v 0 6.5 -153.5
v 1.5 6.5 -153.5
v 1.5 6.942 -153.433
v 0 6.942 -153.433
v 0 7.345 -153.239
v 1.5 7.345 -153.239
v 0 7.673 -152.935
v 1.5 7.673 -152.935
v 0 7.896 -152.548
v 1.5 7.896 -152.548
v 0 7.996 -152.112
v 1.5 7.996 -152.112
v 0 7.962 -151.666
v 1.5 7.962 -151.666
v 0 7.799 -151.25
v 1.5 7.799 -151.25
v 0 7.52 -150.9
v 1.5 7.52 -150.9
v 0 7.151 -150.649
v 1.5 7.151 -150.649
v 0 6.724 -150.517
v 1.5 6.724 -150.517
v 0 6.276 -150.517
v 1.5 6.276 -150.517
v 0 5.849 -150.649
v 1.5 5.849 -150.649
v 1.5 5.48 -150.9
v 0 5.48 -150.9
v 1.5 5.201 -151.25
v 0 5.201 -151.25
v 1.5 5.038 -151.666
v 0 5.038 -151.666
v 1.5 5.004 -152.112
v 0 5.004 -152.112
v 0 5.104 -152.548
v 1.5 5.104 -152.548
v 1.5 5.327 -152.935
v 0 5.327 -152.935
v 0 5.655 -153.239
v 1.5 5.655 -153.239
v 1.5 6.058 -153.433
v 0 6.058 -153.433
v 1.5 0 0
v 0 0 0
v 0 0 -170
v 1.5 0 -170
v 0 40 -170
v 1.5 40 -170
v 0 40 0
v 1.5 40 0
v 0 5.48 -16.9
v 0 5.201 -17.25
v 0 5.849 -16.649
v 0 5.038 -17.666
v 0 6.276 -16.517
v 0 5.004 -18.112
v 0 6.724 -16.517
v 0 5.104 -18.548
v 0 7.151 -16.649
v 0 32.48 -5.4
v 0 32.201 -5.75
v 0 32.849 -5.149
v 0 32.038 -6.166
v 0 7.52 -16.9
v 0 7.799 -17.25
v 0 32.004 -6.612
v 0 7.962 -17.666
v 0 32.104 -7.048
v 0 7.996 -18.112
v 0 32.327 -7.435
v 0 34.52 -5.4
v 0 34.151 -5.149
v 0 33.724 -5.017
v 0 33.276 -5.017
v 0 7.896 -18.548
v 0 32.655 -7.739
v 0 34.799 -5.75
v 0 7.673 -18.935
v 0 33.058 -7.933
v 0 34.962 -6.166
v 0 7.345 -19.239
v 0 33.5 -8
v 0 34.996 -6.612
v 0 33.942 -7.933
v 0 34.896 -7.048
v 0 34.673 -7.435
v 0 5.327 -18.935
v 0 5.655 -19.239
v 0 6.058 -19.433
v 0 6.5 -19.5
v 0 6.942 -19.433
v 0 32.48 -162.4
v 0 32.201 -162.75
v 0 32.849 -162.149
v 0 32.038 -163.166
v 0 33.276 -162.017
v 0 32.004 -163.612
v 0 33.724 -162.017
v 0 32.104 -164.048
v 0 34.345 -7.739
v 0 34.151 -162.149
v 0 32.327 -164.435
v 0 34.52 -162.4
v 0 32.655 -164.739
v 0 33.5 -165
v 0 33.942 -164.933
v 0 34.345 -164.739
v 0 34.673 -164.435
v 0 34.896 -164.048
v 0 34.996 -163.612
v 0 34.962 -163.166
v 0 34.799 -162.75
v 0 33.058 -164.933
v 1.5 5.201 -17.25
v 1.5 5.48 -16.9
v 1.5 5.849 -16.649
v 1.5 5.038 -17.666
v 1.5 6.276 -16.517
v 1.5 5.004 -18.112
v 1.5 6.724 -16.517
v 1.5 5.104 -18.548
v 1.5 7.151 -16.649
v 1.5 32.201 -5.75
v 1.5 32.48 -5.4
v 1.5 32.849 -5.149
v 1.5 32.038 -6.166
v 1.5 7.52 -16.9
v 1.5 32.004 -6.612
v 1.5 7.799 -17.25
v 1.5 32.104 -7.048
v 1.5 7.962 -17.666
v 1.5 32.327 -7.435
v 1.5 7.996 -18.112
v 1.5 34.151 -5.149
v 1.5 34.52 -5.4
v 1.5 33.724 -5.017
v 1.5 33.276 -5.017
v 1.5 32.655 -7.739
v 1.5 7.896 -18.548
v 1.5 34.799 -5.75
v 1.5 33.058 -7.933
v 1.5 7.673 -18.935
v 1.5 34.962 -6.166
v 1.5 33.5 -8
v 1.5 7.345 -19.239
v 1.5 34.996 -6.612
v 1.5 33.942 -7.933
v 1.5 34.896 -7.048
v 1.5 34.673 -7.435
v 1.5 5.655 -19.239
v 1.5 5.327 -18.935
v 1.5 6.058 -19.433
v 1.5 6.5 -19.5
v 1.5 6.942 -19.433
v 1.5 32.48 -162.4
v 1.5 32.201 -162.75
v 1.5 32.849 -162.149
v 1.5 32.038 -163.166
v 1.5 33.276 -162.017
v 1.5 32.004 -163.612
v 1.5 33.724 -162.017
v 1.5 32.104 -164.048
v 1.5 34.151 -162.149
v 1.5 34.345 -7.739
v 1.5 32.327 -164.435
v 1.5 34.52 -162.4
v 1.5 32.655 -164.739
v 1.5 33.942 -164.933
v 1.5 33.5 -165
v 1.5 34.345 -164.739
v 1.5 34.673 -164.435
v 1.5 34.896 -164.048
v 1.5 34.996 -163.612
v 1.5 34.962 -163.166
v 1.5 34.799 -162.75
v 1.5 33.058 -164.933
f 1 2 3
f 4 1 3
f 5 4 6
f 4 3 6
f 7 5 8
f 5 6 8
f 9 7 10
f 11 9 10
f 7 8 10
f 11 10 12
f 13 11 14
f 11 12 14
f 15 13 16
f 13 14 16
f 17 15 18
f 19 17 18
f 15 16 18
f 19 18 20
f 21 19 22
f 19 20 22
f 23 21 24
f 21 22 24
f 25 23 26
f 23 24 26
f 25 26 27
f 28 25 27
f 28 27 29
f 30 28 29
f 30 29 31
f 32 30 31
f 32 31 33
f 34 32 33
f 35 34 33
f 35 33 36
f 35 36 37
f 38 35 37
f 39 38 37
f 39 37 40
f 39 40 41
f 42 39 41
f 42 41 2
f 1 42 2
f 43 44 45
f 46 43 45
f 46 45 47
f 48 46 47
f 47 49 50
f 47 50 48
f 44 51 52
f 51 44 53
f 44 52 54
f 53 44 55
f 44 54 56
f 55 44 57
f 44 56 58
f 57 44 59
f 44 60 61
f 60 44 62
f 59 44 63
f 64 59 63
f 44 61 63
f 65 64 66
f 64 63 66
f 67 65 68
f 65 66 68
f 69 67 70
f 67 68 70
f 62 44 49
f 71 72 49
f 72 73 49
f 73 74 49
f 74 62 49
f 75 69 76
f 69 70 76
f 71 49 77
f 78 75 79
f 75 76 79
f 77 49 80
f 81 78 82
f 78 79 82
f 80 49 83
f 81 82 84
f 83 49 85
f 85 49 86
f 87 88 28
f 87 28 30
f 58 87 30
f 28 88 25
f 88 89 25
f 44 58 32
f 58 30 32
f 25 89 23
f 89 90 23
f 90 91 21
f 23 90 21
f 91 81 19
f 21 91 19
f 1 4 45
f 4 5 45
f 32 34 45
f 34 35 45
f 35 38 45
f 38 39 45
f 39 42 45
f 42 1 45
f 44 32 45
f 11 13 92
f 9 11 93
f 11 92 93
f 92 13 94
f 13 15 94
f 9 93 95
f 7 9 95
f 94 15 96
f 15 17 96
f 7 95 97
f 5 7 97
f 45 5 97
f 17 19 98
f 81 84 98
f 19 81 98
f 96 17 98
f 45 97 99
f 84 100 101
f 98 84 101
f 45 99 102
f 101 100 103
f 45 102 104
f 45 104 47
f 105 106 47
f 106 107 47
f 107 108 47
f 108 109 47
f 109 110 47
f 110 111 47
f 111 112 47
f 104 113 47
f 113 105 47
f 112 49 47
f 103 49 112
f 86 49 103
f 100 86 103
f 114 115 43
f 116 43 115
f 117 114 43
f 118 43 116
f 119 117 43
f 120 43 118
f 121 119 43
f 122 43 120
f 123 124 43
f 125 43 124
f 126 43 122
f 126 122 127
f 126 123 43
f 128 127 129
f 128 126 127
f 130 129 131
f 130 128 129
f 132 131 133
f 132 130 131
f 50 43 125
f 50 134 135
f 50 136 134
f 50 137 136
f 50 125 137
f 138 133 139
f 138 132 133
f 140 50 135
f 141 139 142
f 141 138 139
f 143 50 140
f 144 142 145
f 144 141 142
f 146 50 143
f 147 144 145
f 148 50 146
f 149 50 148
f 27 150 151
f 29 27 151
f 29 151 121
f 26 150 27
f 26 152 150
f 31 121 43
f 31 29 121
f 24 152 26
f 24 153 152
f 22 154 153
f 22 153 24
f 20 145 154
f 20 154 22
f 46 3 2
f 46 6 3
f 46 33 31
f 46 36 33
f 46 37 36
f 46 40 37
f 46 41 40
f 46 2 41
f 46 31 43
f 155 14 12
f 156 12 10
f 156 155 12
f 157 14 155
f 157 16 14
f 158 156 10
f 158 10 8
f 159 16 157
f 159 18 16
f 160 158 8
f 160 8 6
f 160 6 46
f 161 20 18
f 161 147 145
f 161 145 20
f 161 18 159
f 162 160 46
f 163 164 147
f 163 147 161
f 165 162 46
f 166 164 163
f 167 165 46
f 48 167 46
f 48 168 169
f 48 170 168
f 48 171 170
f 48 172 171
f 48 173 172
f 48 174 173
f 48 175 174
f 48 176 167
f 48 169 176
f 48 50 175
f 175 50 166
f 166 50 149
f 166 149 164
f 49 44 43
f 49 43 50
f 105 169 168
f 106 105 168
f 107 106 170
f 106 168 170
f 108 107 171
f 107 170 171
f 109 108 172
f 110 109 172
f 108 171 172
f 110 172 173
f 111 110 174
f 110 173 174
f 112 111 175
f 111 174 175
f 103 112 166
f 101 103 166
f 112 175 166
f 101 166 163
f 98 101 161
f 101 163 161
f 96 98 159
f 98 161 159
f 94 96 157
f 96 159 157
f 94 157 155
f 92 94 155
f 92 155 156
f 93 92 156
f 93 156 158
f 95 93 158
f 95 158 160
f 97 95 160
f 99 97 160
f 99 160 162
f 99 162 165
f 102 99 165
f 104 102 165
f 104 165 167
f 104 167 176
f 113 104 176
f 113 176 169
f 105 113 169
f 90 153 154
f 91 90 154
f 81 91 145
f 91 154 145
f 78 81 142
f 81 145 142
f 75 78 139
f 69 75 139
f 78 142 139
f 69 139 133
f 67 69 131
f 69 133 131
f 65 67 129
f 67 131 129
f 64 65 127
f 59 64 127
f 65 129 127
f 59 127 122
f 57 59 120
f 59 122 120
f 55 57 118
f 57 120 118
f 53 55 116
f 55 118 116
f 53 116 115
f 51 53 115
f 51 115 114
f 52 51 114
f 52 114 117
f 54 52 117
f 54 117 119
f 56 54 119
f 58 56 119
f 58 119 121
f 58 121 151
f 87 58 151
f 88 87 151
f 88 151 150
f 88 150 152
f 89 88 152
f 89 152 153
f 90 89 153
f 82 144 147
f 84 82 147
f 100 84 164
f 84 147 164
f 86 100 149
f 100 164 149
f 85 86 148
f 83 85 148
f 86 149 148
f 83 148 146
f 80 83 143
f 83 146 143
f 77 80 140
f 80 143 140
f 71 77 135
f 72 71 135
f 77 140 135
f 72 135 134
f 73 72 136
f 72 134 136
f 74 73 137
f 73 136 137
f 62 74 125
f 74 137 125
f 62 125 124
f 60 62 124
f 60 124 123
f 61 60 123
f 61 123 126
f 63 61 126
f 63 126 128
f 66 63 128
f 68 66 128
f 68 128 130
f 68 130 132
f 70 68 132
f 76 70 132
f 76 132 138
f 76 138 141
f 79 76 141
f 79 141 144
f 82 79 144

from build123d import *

# Parameters (mm, degrees)
SKETCH1_W               = 170
SKETCH1_H               = 40
BOSS_EXTRUDE1_DEPTH     = 1.5
CUT_EXTRUDE1_DEPTH      = 15
CUT_EXTRUDE1_DEPTH_BACK = 15
SKETCH2_R               = 1.5


with BuildPart() as part:
    # Sketch1 → Boss-Extrude1 (new body)
    with BuildSketch(Plane(origin=(0, 0, 0), x_dir=(0, 0, -1), z_dir=(1, 0, 0))):
        with Locations((85, 20)):
            Rectangle(SKETCH1_W, SKETCH1_H)
    extrude(amount=BOSS_EXTRUDE1_DEPTH)

    # Sketch2 → Cut-Extrude1 (cut, two sides: drawn at the far end of the back side and taken through both)
    with BuildSketch(Plane(origin=(1.5, 0, 0), x_dir=(0, 0, -1), z_dir=(1, 0, 0)).offset(-CUT_EXTRUDE1_DEPTH_BACK)):
        with Locations((18, 6.5)):
            Circle(SKETCH2_R)
        with Locations((152, 6.5)):
            Circle(SKETCH2_R)
        with Locations((163.5, 33.5)):
            Circle(SKETCH2_R)
        with Locations((6.5, 33.5)):
            Circle(SKETCH2_R)
    extrude(amount=CUT_EXTRUDE1_DEPTH + CUT_EXTRUDE1_DEPTH_BACK, mode=Mode.SUBTRACT)


solid = part.part
